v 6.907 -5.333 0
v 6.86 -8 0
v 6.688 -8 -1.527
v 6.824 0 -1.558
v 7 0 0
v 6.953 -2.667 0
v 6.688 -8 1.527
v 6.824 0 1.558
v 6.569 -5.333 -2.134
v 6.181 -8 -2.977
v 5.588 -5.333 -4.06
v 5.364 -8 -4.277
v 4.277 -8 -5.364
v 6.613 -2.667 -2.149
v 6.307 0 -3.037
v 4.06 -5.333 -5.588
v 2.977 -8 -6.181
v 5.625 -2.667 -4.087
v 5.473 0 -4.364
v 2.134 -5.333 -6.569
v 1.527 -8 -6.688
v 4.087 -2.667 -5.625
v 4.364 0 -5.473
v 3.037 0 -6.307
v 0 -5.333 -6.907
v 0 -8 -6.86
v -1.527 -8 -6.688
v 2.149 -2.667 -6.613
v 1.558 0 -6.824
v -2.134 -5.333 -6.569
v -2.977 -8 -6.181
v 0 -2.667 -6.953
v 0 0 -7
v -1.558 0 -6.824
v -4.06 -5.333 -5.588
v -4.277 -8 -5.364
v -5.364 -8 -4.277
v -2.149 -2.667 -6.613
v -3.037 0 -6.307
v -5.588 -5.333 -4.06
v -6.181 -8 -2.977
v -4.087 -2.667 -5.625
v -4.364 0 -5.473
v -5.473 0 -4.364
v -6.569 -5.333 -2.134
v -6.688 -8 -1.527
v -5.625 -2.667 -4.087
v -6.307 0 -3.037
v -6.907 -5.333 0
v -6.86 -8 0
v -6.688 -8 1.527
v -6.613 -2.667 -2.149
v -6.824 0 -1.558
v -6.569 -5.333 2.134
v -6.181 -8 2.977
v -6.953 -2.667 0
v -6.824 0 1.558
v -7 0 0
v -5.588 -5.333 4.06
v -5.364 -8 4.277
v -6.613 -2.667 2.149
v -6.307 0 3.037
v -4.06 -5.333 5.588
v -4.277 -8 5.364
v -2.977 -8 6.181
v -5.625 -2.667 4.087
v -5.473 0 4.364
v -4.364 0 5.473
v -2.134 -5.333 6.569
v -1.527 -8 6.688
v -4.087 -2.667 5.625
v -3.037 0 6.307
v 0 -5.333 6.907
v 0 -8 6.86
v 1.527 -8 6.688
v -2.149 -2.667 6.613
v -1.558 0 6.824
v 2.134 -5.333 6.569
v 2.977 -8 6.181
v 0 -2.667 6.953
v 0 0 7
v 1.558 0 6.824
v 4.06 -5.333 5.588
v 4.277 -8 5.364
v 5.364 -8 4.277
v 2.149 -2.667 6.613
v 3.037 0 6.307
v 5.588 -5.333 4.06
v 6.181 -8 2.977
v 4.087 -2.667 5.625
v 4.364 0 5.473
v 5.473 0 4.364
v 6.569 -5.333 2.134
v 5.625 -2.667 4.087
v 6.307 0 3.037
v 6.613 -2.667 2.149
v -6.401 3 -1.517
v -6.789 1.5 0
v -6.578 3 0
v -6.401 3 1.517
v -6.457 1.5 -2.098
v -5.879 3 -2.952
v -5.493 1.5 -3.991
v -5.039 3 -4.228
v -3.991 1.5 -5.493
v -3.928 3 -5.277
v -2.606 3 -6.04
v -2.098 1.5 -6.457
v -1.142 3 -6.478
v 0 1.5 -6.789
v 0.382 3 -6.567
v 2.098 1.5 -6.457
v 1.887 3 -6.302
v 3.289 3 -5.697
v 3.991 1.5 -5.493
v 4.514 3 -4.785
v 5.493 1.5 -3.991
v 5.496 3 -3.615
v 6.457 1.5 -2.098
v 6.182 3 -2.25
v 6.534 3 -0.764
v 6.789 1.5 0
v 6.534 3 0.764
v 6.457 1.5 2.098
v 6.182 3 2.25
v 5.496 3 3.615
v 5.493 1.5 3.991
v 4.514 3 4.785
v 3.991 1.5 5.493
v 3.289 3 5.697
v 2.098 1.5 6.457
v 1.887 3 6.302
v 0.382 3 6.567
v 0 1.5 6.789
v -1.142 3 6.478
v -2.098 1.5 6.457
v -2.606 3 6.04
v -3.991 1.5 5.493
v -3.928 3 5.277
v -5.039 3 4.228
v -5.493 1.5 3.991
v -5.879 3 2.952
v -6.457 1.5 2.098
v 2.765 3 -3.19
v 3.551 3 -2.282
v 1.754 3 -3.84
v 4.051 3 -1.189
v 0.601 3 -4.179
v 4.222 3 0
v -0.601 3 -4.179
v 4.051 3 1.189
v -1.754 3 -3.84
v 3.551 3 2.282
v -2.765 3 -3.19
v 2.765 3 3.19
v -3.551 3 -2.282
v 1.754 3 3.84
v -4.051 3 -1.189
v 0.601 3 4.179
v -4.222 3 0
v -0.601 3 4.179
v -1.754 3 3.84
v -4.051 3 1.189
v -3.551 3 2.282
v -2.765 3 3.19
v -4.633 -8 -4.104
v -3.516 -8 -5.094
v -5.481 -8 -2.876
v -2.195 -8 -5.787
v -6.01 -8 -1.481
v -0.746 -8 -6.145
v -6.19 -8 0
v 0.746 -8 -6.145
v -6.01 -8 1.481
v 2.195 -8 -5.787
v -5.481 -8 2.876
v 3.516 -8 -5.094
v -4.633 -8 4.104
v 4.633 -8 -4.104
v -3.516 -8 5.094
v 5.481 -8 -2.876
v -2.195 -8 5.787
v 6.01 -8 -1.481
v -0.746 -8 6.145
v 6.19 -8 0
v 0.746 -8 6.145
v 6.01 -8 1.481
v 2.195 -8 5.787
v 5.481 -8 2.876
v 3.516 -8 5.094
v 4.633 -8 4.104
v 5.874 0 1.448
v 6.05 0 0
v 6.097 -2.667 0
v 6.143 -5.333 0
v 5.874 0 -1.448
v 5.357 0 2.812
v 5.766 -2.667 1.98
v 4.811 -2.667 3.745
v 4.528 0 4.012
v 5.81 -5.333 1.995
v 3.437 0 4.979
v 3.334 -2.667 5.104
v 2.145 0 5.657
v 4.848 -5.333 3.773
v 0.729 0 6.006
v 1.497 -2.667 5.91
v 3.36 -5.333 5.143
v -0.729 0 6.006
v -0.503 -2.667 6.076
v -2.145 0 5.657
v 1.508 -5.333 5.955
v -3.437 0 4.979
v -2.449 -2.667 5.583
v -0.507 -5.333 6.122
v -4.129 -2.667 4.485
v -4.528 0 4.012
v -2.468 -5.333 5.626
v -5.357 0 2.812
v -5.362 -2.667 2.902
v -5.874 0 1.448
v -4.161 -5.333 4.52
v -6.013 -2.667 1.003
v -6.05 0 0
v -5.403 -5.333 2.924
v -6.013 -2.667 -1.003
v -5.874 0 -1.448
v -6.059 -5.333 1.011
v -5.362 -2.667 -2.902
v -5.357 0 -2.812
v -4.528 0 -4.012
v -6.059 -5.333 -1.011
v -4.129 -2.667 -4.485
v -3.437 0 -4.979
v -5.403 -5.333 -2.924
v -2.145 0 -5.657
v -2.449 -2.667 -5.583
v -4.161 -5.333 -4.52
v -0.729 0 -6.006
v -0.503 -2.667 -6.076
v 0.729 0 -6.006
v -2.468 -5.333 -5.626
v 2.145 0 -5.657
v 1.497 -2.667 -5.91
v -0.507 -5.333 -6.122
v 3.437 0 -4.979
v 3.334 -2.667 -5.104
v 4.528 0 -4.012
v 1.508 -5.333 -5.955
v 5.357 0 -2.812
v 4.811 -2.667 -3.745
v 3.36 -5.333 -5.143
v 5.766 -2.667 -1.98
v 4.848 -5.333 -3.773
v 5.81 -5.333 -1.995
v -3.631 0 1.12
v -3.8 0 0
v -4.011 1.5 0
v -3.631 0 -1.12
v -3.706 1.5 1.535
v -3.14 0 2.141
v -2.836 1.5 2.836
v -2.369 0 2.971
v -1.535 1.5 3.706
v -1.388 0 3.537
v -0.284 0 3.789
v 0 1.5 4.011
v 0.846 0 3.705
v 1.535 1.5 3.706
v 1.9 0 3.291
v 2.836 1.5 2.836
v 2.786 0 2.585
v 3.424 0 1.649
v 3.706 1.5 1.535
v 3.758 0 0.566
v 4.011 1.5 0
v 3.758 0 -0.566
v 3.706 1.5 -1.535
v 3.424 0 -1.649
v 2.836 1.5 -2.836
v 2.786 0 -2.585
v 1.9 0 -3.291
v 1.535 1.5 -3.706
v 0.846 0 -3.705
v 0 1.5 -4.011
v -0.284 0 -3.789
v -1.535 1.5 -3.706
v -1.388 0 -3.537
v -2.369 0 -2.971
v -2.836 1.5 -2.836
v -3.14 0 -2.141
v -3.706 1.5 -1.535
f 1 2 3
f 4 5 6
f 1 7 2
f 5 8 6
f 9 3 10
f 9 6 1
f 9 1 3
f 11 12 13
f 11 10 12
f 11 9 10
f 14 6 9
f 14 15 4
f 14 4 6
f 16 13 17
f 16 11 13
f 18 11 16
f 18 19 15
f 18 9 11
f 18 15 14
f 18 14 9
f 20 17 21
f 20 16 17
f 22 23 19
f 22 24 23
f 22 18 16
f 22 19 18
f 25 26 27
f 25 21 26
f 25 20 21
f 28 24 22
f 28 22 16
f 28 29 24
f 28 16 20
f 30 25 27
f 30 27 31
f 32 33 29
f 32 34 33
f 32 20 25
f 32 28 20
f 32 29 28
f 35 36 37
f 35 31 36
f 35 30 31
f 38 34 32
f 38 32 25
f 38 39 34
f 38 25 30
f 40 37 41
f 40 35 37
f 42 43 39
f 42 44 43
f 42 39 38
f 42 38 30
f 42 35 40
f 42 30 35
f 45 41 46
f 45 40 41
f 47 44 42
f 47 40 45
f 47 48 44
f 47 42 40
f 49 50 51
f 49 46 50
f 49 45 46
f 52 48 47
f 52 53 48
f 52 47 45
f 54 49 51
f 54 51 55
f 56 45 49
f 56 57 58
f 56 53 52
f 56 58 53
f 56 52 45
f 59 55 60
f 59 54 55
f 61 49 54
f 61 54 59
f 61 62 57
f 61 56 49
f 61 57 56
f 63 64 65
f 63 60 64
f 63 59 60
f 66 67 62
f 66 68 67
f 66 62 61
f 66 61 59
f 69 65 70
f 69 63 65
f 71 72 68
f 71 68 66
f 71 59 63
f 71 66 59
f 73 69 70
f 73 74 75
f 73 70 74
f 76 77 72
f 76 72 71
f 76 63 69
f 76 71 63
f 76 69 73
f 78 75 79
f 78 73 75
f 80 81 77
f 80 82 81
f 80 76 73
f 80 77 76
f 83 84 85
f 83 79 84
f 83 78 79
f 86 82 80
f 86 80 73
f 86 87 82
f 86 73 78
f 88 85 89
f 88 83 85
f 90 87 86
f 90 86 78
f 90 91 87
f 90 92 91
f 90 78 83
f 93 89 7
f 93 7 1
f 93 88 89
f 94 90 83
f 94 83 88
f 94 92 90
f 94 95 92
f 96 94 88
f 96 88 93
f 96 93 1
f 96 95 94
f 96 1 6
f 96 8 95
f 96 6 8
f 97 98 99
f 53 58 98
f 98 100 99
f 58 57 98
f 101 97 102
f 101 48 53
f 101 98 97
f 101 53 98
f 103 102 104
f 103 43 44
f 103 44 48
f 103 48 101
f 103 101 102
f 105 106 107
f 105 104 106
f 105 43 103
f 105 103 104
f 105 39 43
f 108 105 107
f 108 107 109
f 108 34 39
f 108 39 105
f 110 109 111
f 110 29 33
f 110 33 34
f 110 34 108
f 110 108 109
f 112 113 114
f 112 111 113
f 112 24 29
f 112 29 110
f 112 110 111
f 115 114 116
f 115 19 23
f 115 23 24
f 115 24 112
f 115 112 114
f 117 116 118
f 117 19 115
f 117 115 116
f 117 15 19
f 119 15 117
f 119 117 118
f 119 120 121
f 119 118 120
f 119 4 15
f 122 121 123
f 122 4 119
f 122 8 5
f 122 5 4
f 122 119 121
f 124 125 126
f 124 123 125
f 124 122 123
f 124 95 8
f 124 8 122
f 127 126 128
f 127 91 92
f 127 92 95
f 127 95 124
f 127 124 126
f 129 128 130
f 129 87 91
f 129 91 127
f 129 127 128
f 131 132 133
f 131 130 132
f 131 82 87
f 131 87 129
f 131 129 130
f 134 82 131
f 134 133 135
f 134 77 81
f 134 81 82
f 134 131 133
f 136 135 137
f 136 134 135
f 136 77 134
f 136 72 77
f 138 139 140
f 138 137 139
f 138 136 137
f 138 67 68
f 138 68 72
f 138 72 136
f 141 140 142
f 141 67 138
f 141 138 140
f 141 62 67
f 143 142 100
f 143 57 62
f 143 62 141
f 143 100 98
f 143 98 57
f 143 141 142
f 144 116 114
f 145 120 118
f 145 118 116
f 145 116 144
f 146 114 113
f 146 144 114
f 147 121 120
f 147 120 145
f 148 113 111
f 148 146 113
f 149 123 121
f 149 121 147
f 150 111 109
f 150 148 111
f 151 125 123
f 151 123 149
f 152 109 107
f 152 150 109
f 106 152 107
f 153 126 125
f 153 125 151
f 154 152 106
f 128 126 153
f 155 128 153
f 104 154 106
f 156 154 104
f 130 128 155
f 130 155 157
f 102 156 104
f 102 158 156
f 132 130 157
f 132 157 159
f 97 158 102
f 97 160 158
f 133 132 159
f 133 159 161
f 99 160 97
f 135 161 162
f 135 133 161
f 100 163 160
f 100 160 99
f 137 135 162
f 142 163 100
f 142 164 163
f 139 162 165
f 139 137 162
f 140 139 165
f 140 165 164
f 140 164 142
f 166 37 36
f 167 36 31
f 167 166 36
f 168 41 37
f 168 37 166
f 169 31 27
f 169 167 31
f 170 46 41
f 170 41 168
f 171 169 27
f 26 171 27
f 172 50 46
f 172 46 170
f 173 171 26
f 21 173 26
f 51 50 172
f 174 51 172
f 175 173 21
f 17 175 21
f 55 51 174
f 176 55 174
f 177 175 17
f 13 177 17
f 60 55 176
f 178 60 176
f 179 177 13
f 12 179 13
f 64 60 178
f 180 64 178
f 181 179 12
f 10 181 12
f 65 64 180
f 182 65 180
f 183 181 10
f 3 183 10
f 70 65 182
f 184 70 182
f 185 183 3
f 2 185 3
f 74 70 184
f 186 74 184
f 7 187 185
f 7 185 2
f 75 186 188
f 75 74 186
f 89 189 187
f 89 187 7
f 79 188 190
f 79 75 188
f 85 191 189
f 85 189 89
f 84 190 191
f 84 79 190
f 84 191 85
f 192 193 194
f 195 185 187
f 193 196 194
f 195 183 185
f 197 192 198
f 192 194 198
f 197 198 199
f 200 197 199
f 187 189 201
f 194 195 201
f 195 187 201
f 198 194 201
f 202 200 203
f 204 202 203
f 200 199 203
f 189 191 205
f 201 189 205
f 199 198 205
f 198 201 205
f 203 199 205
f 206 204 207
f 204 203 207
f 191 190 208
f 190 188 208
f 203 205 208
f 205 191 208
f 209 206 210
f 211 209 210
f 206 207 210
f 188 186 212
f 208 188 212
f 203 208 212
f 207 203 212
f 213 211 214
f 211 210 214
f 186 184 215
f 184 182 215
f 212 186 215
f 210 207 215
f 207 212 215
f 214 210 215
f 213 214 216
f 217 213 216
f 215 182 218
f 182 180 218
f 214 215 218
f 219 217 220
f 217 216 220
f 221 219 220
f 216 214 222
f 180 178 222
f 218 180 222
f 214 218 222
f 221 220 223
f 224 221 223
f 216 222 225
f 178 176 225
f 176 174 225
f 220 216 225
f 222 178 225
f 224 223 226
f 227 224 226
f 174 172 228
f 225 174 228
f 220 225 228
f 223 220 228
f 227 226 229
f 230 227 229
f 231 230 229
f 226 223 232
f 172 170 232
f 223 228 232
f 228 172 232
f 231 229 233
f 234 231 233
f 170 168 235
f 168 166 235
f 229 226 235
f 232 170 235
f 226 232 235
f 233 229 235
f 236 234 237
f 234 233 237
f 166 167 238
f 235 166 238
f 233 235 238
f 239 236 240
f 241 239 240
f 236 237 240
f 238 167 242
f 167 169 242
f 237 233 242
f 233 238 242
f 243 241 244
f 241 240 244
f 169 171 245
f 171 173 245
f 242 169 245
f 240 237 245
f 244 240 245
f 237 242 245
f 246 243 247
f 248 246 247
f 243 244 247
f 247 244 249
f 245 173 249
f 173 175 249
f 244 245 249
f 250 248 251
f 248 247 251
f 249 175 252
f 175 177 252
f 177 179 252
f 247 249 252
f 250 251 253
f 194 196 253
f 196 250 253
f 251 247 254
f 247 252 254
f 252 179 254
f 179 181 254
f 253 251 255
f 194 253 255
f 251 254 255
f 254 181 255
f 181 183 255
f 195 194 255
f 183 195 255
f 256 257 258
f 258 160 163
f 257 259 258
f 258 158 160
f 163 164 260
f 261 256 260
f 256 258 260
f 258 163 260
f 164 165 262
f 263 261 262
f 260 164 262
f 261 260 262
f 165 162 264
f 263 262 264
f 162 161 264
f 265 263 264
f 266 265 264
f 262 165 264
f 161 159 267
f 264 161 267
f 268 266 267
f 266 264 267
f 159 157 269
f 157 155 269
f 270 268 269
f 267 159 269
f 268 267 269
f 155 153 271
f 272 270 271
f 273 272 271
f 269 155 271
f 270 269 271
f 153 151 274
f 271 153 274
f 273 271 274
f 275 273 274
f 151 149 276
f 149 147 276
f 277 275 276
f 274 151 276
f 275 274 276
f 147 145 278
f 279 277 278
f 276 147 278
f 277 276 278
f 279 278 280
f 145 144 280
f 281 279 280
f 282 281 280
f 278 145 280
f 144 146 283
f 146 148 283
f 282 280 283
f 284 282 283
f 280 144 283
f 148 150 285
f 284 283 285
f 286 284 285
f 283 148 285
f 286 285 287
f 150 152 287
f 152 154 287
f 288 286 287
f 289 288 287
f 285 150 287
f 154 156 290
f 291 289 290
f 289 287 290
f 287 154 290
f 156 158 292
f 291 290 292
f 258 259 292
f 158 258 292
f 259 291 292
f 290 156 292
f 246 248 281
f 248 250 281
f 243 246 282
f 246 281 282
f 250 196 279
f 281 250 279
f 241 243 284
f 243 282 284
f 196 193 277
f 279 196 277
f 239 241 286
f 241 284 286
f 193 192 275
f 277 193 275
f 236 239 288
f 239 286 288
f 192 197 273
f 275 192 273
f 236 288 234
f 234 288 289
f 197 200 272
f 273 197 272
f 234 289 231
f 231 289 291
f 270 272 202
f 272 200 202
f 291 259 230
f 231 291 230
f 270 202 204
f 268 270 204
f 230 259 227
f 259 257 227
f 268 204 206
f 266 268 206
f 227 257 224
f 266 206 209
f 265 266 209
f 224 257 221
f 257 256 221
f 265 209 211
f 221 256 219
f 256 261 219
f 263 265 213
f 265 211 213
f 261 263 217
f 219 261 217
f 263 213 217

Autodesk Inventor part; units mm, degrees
ref_plane "YZ Plane" through (0, 0, 0) normal (1, 0, 0) x (0, 1, 0)
ref_plane "XZ Plane" through (0, 0, 0) normal (0, 1, 0) x (-1, 0, 0)
ref_plane "XY Plane" through (0, 0, 0) normal (0, 0, 1) x (1, 0, 0)
sketch "Skizze1" plane through (0, 0, 0) normal (0, 1, 0) x (-1, 0, 0)
  circle A0 centre (0, 0) radius 7
  circle A1 centre (0, 0) radius 3.8
  dimension "d0" = 14
  dimension "d1" = 7.6
extrude "Extrusion1" add sketch "Skizze1" along normal blind 3 draft -8
ref_plane "Arbeitsebene1" through (0, -0.6, 0) normal (0, -1, 0) x (1, 0, 0)
sketch "Skizze3" plane through (0, 0, 0) normal (0, -1, 0) x (1, 0, 0)
  circle A0 centre (0, 0) radius 7 projected
  circle A1 centre (0, 0) radius 6.05
  dimension "d7" = 12.1
extrude "Extrusion3" add sketch "Skizze3" along normal blind 8 draft -1
properties part number "ESP32_M12_CCTVAdapter"
